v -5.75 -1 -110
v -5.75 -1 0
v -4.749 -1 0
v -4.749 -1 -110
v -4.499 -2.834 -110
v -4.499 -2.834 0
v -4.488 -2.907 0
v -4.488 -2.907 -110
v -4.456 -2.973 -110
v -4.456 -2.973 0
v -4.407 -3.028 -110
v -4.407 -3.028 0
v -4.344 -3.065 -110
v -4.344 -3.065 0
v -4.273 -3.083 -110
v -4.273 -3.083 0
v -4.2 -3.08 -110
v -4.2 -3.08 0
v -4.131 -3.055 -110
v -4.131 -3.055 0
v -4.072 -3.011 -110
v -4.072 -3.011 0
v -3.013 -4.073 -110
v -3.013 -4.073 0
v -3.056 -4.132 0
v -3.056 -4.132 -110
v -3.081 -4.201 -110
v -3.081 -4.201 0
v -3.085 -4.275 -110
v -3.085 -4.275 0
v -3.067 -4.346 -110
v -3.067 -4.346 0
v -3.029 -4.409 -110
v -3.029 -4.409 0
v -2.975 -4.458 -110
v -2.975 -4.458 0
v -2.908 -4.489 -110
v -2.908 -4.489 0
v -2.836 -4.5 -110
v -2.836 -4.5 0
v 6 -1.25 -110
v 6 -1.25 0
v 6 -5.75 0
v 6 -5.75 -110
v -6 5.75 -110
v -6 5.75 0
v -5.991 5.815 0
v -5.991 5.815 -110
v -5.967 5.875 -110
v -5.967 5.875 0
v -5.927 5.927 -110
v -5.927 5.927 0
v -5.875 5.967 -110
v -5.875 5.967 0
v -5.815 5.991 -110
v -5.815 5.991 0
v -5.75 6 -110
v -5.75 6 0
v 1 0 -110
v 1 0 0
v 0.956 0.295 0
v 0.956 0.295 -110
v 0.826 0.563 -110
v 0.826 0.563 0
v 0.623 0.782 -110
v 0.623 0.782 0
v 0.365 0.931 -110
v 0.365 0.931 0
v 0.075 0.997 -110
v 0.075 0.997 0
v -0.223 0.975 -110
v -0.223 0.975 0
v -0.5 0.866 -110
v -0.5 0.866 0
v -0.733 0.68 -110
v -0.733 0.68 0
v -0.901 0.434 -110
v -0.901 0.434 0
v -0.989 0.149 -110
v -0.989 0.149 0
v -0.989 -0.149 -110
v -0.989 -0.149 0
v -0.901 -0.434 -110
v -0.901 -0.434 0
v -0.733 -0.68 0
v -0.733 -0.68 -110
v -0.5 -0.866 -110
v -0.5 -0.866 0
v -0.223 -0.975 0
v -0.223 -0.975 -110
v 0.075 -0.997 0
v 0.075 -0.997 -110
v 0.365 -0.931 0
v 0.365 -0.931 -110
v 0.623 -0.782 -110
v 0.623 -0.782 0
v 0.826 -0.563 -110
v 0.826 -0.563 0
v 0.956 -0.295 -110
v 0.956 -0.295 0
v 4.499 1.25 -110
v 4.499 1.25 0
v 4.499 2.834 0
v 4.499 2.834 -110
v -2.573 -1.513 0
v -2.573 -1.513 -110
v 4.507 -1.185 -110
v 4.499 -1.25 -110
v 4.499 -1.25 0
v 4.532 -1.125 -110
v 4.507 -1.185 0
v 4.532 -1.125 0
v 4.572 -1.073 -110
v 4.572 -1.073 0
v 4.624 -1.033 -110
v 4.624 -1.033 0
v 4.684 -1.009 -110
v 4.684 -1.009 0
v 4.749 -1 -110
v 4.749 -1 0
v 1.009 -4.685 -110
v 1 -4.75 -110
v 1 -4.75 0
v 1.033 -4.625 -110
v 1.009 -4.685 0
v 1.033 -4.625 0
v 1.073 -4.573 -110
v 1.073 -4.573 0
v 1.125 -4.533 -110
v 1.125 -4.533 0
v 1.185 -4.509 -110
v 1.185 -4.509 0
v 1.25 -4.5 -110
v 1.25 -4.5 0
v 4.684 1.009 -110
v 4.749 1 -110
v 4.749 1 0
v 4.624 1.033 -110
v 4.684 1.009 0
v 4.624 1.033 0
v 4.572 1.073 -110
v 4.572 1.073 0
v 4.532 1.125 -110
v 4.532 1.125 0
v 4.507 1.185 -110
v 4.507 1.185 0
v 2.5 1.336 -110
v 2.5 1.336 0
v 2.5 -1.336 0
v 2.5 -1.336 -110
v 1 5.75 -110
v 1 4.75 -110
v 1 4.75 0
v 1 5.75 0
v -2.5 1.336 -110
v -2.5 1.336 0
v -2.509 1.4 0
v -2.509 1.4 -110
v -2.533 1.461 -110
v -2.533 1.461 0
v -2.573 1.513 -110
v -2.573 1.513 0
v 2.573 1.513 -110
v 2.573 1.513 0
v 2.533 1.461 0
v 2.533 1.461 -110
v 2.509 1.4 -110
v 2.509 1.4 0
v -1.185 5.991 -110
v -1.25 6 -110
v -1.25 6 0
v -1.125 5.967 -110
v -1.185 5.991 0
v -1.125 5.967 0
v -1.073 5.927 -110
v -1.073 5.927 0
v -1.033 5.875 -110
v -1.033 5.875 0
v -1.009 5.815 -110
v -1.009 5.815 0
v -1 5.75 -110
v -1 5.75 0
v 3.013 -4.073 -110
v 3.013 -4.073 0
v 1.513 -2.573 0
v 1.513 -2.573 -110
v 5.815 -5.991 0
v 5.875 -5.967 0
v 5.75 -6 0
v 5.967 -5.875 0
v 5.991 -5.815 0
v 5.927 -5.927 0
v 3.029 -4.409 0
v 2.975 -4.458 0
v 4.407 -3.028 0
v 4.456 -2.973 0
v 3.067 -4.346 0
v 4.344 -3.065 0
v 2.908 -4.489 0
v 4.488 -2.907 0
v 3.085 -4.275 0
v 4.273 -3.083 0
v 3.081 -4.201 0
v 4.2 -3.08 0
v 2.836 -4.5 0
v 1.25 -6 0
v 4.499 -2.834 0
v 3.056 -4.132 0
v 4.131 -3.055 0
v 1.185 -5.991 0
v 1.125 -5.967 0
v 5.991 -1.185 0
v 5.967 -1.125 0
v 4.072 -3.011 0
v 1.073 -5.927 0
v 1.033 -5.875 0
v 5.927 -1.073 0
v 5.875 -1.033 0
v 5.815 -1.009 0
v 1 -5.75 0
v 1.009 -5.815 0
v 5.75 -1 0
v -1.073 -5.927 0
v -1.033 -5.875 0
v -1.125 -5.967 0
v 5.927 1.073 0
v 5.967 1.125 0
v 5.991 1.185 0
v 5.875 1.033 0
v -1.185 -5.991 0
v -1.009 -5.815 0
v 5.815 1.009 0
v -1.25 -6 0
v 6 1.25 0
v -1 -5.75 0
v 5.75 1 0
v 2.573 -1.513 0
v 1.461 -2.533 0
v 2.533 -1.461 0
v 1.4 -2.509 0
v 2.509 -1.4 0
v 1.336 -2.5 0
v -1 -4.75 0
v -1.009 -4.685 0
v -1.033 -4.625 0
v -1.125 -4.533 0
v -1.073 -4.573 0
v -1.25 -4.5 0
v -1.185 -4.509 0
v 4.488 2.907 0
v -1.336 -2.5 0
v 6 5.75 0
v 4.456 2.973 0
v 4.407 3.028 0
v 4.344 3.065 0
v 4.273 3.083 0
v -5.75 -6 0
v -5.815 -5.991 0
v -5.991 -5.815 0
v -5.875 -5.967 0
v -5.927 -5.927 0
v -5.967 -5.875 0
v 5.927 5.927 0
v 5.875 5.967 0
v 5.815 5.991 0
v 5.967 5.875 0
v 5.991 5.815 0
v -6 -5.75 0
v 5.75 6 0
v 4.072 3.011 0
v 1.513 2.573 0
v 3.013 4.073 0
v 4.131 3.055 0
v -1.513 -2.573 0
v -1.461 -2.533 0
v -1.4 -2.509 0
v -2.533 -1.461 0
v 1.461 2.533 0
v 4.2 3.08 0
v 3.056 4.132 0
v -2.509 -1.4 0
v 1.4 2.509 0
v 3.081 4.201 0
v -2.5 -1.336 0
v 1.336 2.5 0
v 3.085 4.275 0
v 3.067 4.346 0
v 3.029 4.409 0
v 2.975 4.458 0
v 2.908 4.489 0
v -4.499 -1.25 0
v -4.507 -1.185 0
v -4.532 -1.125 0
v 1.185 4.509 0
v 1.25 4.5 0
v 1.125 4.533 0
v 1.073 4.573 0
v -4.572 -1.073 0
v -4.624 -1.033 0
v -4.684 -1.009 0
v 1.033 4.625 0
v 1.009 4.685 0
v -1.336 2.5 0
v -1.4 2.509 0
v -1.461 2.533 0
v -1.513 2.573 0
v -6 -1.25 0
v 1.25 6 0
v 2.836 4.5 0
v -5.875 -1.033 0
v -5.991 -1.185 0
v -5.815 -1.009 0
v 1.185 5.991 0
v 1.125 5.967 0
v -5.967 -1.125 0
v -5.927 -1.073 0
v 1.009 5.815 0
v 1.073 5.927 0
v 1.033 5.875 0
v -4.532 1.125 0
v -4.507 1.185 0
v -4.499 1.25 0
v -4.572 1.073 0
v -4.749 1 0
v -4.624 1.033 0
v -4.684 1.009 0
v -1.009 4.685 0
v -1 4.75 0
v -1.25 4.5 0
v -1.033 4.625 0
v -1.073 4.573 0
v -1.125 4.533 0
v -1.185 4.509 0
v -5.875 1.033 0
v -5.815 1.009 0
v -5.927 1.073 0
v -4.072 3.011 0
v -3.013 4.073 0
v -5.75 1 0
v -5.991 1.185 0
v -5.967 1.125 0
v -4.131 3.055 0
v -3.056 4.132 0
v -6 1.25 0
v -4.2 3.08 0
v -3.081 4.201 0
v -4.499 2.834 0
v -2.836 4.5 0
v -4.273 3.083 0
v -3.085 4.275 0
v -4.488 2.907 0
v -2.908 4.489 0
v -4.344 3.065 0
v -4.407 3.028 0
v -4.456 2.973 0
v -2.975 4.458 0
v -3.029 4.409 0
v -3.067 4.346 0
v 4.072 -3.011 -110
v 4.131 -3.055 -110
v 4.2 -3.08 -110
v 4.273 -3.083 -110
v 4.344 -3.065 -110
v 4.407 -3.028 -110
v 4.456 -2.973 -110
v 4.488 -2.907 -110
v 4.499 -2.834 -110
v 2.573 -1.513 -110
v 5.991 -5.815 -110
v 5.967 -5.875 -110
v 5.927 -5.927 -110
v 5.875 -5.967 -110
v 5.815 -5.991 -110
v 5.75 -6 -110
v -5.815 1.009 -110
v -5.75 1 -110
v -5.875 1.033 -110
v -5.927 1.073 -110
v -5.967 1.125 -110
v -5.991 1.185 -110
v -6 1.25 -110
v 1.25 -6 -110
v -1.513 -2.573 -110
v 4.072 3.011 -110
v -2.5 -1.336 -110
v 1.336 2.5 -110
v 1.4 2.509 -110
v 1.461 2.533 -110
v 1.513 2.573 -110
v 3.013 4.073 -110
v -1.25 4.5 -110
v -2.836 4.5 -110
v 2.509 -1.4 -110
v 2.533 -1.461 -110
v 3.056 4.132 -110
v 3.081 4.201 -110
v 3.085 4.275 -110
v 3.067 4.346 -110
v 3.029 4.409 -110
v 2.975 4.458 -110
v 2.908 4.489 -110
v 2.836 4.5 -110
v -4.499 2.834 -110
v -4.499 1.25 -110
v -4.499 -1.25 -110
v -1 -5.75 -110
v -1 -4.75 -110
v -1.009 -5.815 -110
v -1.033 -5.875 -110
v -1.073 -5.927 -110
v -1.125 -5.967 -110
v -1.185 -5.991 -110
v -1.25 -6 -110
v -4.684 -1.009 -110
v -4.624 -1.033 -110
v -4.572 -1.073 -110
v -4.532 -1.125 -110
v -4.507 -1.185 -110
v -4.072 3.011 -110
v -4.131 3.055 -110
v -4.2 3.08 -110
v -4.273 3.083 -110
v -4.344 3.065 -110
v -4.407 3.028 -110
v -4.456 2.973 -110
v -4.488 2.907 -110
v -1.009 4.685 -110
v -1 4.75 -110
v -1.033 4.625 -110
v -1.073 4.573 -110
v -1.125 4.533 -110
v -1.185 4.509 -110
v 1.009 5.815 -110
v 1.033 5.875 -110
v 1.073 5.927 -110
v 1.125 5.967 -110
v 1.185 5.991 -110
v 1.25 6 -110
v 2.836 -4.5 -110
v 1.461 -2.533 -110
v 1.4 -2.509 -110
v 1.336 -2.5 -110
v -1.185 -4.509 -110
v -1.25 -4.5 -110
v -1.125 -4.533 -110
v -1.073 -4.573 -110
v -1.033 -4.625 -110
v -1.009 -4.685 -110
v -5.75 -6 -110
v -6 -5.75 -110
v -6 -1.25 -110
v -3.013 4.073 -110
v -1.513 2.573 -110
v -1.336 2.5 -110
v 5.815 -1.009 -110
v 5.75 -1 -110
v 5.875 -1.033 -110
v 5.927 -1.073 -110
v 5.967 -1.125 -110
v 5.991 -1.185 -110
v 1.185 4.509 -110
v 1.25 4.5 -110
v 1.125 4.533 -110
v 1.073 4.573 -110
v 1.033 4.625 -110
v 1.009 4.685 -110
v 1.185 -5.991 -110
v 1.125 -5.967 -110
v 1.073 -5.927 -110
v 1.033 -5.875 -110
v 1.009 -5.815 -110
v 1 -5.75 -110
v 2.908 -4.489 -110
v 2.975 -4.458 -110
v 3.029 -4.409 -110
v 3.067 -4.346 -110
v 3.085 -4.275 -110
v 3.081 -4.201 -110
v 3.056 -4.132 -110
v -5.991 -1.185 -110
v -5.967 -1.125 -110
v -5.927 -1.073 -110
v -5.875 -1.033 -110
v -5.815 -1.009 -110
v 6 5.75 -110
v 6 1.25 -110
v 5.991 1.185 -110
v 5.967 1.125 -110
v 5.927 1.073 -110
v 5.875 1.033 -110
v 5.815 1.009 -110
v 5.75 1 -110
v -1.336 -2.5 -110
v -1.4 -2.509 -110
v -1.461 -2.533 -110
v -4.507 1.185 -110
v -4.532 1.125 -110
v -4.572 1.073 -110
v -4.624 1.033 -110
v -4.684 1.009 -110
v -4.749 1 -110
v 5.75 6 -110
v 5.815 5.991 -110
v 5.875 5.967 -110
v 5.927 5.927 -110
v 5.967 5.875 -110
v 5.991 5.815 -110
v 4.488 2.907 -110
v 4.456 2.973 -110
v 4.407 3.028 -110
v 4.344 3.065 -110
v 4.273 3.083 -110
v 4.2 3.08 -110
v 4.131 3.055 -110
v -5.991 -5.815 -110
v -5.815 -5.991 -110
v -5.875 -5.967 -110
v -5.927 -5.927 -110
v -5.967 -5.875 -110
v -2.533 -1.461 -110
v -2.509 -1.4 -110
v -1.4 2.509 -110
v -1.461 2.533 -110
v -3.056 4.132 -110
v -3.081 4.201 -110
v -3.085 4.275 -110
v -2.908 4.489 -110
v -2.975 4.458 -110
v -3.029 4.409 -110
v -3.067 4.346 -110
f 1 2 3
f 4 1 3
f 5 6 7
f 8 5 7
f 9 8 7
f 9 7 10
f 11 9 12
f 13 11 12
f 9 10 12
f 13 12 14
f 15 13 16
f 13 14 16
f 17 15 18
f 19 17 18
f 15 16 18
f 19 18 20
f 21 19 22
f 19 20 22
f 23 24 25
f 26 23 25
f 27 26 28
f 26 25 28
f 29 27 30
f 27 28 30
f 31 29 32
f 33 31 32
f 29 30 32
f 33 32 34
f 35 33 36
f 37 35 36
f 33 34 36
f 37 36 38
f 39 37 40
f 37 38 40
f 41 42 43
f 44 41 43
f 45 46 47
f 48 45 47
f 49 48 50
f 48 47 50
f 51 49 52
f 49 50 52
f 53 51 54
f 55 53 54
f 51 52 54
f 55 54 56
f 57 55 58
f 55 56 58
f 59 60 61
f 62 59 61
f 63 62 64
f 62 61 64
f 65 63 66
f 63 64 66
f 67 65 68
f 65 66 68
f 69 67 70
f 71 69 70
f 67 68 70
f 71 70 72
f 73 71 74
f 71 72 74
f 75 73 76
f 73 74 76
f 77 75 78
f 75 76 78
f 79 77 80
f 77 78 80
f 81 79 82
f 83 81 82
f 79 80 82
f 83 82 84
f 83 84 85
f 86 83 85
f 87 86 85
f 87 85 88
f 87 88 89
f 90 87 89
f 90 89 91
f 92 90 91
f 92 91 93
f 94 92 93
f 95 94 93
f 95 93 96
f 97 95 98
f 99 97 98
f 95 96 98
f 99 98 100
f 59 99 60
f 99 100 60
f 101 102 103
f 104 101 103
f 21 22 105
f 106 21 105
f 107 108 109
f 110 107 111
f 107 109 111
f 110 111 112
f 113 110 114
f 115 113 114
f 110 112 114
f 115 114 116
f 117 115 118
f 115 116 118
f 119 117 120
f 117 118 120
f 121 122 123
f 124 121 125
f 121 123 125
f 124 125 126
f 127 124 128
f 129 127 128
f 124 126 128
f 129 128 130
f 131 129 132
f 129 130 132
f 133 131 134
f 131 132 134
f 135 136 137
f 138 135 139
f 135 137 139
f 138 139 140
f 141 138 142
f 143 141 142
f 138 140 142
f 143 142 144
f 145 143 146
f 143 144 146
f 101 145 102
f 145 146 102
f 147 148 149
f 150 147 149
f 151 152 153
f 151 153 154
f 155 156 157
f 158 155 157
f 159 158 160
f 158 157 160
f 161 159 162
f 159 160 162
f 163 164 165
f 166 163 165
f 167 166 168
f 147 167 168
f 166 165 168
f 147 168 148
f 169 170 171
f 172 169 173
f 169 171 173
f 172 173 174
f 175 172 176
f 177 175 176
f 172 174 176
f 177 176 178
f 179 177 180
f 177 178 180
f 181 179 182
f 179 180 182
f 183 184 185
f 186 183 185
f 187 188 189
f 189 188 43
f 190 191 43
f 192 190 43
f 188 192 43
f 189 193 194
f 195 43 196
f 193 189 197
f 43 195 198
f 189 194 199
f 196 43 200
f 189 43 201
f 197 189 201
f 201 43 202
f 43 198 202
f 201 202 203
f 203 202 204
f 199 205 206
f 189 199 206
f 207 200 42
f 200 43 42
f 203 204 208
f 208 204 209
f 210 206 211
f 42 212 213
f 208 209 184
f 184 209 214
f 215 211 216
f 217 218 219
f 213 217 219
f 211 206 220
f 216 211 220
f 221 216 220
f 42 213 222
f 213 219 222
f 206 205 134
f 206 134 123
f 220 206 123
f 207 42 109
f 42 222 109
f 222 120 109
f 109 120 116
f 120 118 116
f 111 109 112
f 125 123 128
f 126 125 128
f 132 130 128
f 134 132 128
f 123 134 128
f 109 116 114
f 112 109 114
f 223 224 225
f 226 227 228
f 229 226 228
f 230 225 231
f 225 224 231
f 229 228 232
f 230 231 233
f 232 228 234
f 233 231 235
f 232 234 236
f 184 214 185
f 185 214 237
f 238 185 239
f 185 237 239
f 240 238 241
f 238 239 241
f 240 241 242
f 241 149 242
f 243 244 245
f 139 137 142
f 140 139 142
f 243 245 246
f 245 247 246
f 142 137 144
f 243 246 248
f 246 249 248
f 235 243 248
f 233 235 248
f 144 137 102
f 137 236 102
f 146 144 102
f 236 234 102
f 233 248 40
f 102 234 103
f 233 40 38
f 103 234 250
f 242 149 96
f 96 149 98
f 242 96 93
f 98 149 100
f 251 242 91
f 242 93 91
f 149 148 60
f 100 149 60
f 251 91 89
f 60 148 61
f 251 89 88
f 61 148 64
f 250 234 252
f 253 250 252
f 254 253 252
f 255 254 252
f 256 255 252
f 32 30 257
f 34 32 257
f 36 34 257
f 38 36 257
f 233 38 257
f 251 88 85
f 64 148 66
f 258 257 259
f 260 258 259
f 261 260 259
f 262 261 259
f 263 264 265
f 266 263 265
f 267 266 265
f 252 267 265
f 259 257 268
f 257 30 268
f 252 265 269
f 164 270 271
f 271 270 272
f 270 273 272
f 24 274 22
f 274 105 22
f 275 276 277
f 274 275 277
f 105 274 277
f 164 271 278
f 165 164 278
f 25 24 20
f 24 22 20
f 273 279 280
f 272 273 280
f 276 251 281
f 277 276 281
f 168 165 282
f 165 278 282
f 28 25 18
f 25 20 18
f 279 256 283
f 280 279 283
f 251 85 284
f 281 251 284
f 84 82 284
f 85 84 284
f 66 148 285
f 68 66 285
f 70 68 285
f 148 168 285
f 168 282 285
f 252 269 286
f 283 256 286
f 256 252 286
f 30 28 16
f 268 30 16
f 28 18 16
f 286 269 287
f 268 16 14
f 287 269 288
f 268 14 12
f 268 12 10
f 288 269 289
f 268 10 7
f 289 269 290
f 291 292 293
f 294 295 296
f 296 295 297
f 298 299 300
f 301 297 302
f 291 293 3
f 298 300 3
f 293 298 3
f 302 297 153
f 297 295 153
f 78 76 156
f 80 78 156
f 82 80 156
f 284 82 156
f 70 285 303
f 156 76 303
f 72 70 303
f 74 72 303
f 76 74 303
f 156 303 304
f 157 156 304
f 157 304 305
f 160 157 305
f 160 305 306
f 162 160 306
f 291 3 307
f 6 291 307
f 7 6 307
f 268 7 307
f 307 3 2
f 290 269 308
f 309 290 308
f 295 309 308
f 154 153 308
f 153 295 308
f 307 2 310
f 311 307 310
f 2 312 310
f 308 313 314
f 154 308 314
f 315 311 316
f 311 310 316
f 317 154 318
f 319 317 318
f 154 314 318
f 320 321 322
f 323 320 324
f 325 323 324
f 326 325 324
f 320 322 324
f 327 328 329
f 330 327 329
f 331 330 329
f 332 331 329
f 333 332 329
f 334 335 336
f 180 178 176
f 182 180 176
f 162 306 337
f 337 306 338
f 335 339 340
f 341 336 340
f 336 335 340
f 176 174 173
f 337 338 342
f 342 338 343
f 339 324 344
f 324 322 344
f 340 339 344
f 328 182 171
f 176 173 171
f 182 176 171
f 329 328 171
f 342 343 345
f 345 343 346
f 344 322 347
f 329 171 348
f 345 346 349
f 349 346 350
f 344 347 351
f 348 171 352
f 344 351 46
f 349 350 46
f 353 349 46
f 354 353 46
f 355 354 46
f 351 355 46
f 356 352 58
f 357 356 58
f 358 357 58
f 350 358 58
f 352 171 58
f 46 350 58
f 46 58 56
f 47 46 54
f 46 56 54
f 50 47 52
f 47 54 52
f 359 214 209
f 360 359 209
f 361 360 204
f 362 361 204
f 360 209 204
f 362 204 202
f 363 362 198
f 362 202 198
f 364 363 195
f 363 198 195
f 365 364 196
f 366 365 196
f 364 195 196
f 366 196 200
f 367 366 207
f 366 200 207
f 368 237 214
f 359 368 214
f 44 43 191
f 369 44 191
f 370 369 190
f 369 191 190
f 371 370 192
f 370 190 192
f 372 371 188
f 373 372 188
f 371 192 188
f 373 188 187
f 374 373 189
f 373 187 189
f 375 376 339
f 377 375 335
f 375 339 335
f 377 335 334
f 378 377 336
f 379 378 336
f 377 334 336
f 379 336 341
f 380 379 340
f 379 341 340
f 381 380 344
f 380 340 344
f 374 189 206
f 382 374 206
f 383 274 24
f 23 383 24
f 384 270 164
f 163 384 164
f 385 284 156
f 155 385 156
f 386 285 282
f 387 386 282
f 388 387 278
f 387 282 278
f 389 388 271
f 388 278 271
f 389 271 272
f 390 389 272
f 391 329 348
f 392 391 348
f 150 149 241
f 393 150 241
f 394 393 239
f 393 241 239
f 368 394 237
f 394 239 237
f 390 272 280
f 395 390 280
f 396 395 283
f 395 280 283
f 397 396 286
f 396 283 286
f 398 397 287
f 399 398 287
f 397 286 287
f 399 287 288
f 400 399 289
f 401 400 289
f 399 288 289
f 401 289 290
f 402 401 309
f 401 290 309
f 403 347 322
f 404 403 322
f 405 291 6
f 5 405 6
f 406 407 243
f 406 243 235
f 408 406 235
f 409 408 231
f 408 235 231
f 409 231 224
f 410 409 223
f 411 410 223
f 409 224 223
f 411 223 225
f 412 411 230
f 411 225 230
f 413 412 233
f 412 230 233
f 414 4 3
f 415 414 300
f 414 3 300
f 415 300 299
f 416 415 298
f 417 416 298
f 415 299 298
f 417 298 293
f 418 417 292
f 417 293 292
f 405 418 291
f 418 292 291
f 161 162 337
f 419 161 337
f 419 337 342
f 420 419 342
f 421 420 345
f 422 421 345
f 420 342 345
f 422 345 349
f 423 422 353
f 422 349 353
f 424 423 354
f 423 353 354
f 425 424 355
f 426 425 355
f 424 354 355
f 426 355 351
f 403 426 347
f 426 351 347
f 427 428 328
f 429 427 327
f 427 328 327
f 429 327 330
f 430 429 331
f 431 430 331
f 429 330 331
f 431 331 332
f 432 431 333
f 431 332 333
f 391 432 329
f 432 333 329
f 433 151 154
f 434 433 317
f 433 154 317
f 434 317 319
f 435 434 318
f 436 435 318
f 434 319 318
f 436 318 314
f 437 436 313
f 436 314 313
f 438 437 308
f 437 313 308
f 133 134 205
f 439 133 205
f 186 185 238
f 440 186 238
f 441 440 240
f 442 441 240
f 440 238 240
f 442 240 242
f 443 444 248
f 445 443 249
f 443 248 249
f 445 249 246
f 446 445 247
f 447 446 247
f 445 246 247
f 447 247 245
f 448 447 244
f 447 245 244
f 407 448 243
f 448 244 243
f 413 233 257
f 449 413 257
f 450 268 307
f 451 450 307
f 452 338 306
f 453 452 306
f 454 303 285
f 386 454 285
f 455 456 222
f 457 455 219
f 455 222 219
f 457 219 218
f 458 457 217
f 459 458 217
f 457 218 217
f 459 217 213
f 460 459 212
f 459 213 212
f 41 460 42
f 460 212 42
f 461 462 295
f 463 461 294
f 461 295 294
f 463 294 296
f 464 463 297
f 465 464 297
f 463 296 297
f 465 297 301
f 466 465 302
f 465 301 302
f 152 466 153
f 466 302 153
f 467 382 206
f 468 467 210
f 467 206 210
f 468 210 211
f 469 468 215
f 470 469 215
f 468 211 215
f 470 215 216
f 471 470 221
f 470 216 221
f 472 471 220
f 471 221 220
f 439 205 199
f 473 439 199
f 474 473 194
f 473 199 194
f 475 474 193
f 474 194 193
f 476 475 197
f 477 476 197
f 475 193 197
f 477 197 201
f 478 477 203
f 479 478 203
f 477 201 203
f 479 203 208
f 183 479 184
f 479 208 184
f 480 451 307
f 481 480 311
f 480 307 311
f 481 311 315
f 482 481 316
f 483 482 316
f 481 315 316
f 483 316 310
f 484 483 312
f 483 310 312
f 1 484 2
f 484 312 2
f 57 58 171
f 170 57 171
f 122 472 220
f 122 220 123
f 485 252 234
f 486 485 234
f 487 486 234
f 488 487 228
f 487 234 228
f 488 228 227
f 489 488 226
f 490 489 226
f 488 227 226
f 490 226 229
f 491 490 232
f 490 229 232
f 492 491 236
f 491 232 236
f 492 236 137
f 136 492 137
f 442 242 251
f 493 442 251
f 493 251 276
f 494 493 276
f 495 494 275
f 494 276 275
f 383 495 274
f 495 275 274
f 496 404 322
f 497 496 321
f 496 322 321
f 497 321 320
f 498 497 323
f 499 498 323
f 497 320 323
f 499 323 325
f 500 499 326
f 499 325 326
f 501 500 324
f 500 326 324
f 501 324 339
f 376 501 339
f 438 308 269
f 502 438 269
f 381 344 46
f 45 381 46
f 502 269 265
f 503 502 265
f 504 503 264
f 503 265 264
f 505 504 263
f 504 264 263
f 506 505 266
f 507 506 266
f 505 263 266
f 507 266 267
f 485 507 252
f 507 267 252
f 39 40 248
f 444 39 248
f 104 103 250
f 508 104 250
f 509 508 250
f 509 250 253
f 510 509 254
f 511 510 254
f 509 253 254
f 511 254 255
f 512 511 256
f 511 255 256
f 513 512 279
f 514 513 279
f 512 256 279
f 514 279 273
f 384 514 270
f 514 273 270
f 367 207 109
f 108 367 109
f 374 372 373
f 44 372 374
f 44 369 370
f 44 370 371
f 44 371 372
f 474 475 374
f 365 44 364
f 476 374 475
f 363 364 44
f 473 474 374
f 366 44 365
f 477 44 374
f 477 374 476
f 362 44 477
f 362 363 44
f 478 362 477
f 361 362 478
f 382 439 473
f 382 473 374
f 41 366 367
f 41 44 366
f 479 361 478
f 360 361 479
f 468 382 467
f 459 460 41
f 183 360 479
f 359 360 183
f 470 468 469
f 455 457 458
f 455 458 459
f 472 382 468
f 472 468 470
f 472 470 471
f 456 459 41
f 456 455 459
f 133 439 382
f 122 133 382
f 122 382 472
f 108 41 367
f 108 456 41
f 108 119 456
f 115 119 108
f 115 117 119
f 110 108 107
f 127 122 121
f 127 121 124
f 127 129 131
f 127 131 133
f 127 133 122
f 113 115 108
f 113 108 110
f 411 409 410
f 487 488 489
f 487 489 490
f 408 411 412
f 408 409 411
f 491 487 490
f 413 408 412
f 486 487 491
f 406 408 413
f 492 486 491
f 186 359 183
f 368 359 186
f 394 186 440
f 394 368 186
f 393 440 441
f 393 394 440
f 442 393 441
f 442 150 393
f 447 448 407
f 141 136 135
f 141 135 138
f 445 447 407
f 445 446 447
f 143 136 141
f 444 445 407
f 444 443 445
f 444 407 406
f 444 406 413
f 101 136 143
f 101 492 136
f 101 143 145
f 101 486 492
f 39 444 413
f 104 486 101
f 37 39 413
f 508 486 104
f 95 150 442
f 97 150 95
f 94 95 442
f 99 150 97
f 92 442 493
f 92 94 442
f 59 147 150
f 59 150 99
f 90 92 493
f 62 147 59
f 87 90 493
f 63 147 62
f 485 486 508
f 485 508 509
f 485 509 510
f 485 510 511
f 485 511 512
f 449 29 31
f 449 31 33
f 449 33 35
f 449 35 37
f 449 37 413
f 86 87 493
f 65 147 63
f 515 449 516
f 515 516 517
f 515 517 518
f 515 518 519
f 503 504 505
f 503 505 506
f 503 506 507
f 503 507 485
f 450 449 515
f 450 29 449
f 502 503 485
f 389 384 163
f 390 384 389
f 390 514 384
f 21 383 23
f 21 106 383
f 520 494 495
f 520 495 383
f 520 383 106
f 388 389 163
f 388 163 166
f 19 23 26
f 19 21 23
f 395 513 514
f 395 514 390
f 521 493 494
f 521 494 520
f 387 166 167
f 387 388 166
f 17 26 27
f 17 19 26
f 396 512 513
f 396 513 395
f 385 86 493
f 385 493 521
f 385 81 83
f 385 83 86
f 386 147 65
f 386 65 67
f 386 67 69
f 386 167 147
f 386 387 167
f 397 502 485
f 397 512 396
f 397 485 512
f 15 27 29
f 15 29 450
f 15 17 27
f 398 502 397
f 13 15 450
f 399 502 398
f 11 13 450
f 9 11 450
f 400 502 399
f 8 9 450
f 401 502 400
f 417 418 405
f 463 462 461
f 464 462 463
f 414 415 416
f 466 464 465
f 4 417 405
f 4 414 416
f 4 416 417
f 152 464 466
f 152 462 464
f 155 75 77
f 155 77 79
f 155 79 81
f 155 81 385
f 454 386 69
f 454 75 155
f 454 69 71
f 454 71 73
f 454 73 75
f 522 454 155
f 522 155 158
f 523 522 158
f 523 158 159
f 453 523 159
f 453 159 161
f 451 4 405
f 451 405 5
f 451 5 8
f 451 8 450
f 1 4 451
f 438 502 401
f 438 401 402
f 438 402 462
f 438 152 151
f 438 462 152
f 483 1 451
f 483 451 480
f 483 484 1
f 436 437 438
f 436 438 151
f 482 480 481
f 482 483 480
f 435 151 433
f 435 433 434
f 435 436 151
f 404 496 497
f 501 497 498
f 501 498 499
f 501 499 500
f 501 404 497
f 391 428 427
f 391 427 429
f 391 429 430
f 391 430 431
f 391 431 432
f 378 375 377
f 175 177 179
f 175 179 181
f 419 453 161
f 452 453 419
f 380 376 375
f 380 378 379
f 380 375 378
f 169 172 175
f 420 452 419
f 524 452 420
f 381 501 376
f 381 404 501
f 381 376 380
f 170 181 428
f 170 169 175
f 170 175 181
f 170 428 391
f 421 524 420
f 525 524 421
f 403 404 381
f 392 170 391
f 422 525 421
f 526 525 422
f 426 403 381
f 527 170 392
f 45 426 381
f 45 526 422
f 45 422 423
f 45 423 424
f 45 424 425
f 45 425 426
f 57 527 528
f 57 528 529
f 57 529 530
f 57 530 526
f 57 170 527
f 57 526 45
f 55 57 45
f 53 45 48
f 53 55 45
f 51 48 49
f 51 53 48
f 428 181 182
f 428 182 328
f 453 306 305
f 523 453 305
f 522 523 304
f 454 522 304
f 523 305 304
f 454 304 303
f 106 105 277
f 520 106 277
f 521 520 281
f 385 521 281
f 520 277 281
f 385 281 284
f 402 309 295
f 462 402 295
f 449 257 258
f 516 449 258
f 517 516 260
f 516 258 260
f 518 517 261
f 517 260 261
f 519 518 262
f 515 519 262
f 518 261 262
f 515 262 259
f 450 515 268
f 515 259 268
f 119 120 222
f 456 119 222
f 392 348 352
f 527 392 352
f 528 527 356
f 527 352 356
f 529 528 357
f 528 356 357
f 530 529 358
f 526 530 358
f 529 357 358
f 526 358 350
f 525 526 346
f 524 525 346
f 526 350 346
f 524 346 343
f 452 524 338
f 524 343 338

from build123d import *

# Parameters (mm, degrees)
SKETCH2_R           = 1
BOSS_EXTRUDE1_DEPTH = 110


with BuildPart() as part:
    # Sketch2 → Boss-Extrude1 (new body)
    with BuildSketch(Plane.XY):
        with BuildLine():
            Line((0, 2.5), (1.335786438, 2.5))
            ThreePointArc((1.335786438, 2.5), (1.431457296, 2.519030117), (1.512563133, 2.573223305))
            Line((1.512563133, 2.573223305), (3.012563133, 4.073223305))
            ThreePointArc((3.012563133, 4.073223305), (3.066756321, 4.345670858), (2.835786438, 4.5))
            Line((2.835786438, 4.5), (1.25, 4.5))
            ThreePointArc((1.25, 4.5), (1.073223305, 4.573223305), (1, 4.75))
            Line((1, 4.75), (1, 5.75))
            ThreePointArc((1, 5.75), (1.073223305, 5.926776695), (1.25, 6))
            Line((1.25, 6), (5.75, 6))
            ThreePointArc((5.75, 6), (5.926776695, 5.926776695), (6, 5.75))
            Line((6, 5.75), (6, 1.25))
            ThreePointArc((6, 1.25), (5.926776695, 1.073223305), (5.75, 1))
            Line((5.75, 1), (4.748585621, 1))
            ThreePointArc((4.748585621, 1), (4.571808926, 1.073223305), (4.498585621, 1.25))
            Line((4.498585621, 1.25), (4.498585621, 2.834372059))
            ThreePointArc((4.498585621, 2.834372059), (4.344256479, 3.065341942), (4.071808926, 3.011148754))
            Line((4.071808926, 3.011148754), (2.573223305, 1.512563133))
            ThreePointArc((2.573223305, 1.512563133), (2.519030117, 1.431457296), (2.5, 1.335786438))
            Line((2.5, 1.335786438), (2.5, -1.335786438))
            ThreePointArc((2.5, -1.335786438), (2.519030117, -1.431457296), (2.573223305, -1.512563133))
            Line((2.573223305, -1.512563133), (4.071808926, -3.011148754))
            ThreePointArc((4.071808926, -3.011148754), (4.344256479, -3.065341942), (4.498585621, -2.834372059))
            Line((4.498585621, -2.834372059), (4.498585621, -1.25))
            ThreePointArc((4.498585621, -1.25), (4.571808926, -1.073223305), (4.748585621, -1))
            Line((4.748585621, -1), (5.75, -1))
            ThreePointArc((5.75, -1), (5.926776695, -1.073223305), (6, -1.25))
            Line((6, -1.25), (6, -5.75))
            ThreePointArc((6, -5.75), (5.926776695, -5.926776695), (5.75, -6))
            Line((5.75, -6), (1.25, -6))
            ThreePointArc((1.25, -6), (1.073223305, -5.926776695), (1, -5.75))
            Line((1, -5.75), (1, -4.75))
            ThreePointArc((1, -4.75), (1.073223305, -4.573223305), (1.25, -4.5))
            Line((1.25, -4.5), (2.835786438, -4.5))
            ThreePointArc((2.835786438, -4.5), (3.066756321, -4.345670858), (3.012563133, -4.073223305))
            Line((3.012563133, -4.073223305), (1.512563133, -2.573223305))
            ThreePointArc((1.512563133, -2.573223305), (1.431457296, -2.519030117), (1.335786438, -2.5))
            Line((1.335786438, -2.5), (-1.335786438, -2.5))
            ThreePointArc((-1.335786438, -2.5), (-1.431457296, -2.519030117), (-1.512563133, -2.573223305))
            Line((-1.512563133, -2.573223305), (-3.012563133, -4.073223305))
            ThreePointArc((-3.012563133, -4.073223305), (-3.066756321, -4.345670858), (-2.835786438, -4.5))
            Line((-2.835786438, -4.5), (-1.25, -4.5))
            ThreePointArc((-1.25, -4.5), (-1.073223305, -4.573223305), (-1, -4.75))
            Line((-1, -4.75), (-1, -5.75))
            ThreePointArc((-1, -5.75), (-1.073223305, -5.926776695), (-1.25, -6))
            Line((-1.25, -6), (-5.75, -6))
            ThreePointArc((-5.75, -6), (-5.926776695, -5.926776695), (-6, -5.75))
            Line((-6, -5.75), (-6, -1.25))
            ThreePointArc((-6, -1.25), (-5.926776695, -1.073223305), (-5.75, -1))
            Line((-5.75, -1), (-4.748585621, -1))
            ThreePointArc((-4.748585621, -1), (-4.571808926, -1.073223305), (-4.498585621, -1.25))
            Line((-4.498585621, -1.25), (-4.498585621, -2.834372059))
            ThreePointArc((-4.498585621, -2.834372059), (-4.344256479, -3.065341942), (-4.071808926, -3.011148754))
            Line((-4.071808926, -3.011148754), (-2.573223305, -1.512563133))
            ThreePointArc((-2.573223305, -1.512563133), (-2.519030117, -1.431457296), (-2.5, -1.335786438))
            Line((-2.5, -1.335786438), (-2.5, 1.335786438))
            ThreePointArc((-2.5, 1.335786438), (-2.519030117, 1.431457296), (-2.573223305, 1.512563133))
            Line((-2.573223305, 1.512563133), (-4.071808926, 3.011148754))
            ThreePointArc((-4.071808926, 3.011148754), (-4.344256479, 3.065341942), (-4.498585621, 2.834372059))
            Line((-4.498585621, 2.834372059), (-4.498585621, 1.25))
            ThreePointArc((-4.498585621, 1.25), (-4.571808926, 1.073223305), (-4.748585621, 1))
            Line((-4.748585621, 1), (-5.75, 1))
            ThreePointArc((-5.75, 1), (-5.926776695, 1.073223305), (-6, 1.25))
            Line((-6, 1.25), (-6, 5.75))
            ThreePointArc((-6, 5.75), (-5.926776695, 5.926776695), (-5.75, 6))
            Line((-5.75, 6), (-1.25, 6))
            ThreePointArc((-1.25, 6), (-1.073223305, 5.926776695), (-1, 5.75))
            Line((-1, 5.75), (-1, 4.75))
            ThreePointArc((-1, 4.75), (-1.073223305, 4.573223305), (-1.25, 4.5))
            Line((-1.25, 4.5), (-2.835786438, 4.5))
            ThreePointArc((-2.835786438, 4.5), (-3.066756321, 4.345670858), (-3.012563133, 4.073223305))
            Line((-3.012563133, 4.073223305), (-1.512563133, 2.573223305))
            ThreePointArc((-1.512563133, 2.573223305), (-1.431457296, 2.519030117), (-1.335786438, 2.5))
            Line((-1.335786438, 2.5), (0, 2.5))
        make_face()
        Circle(SKETCH2_R, mode=Mode.SUBTRACT)
    extrude(amount=-BOSS_EXTRUDE1_DEPTH)


solid = part.part
